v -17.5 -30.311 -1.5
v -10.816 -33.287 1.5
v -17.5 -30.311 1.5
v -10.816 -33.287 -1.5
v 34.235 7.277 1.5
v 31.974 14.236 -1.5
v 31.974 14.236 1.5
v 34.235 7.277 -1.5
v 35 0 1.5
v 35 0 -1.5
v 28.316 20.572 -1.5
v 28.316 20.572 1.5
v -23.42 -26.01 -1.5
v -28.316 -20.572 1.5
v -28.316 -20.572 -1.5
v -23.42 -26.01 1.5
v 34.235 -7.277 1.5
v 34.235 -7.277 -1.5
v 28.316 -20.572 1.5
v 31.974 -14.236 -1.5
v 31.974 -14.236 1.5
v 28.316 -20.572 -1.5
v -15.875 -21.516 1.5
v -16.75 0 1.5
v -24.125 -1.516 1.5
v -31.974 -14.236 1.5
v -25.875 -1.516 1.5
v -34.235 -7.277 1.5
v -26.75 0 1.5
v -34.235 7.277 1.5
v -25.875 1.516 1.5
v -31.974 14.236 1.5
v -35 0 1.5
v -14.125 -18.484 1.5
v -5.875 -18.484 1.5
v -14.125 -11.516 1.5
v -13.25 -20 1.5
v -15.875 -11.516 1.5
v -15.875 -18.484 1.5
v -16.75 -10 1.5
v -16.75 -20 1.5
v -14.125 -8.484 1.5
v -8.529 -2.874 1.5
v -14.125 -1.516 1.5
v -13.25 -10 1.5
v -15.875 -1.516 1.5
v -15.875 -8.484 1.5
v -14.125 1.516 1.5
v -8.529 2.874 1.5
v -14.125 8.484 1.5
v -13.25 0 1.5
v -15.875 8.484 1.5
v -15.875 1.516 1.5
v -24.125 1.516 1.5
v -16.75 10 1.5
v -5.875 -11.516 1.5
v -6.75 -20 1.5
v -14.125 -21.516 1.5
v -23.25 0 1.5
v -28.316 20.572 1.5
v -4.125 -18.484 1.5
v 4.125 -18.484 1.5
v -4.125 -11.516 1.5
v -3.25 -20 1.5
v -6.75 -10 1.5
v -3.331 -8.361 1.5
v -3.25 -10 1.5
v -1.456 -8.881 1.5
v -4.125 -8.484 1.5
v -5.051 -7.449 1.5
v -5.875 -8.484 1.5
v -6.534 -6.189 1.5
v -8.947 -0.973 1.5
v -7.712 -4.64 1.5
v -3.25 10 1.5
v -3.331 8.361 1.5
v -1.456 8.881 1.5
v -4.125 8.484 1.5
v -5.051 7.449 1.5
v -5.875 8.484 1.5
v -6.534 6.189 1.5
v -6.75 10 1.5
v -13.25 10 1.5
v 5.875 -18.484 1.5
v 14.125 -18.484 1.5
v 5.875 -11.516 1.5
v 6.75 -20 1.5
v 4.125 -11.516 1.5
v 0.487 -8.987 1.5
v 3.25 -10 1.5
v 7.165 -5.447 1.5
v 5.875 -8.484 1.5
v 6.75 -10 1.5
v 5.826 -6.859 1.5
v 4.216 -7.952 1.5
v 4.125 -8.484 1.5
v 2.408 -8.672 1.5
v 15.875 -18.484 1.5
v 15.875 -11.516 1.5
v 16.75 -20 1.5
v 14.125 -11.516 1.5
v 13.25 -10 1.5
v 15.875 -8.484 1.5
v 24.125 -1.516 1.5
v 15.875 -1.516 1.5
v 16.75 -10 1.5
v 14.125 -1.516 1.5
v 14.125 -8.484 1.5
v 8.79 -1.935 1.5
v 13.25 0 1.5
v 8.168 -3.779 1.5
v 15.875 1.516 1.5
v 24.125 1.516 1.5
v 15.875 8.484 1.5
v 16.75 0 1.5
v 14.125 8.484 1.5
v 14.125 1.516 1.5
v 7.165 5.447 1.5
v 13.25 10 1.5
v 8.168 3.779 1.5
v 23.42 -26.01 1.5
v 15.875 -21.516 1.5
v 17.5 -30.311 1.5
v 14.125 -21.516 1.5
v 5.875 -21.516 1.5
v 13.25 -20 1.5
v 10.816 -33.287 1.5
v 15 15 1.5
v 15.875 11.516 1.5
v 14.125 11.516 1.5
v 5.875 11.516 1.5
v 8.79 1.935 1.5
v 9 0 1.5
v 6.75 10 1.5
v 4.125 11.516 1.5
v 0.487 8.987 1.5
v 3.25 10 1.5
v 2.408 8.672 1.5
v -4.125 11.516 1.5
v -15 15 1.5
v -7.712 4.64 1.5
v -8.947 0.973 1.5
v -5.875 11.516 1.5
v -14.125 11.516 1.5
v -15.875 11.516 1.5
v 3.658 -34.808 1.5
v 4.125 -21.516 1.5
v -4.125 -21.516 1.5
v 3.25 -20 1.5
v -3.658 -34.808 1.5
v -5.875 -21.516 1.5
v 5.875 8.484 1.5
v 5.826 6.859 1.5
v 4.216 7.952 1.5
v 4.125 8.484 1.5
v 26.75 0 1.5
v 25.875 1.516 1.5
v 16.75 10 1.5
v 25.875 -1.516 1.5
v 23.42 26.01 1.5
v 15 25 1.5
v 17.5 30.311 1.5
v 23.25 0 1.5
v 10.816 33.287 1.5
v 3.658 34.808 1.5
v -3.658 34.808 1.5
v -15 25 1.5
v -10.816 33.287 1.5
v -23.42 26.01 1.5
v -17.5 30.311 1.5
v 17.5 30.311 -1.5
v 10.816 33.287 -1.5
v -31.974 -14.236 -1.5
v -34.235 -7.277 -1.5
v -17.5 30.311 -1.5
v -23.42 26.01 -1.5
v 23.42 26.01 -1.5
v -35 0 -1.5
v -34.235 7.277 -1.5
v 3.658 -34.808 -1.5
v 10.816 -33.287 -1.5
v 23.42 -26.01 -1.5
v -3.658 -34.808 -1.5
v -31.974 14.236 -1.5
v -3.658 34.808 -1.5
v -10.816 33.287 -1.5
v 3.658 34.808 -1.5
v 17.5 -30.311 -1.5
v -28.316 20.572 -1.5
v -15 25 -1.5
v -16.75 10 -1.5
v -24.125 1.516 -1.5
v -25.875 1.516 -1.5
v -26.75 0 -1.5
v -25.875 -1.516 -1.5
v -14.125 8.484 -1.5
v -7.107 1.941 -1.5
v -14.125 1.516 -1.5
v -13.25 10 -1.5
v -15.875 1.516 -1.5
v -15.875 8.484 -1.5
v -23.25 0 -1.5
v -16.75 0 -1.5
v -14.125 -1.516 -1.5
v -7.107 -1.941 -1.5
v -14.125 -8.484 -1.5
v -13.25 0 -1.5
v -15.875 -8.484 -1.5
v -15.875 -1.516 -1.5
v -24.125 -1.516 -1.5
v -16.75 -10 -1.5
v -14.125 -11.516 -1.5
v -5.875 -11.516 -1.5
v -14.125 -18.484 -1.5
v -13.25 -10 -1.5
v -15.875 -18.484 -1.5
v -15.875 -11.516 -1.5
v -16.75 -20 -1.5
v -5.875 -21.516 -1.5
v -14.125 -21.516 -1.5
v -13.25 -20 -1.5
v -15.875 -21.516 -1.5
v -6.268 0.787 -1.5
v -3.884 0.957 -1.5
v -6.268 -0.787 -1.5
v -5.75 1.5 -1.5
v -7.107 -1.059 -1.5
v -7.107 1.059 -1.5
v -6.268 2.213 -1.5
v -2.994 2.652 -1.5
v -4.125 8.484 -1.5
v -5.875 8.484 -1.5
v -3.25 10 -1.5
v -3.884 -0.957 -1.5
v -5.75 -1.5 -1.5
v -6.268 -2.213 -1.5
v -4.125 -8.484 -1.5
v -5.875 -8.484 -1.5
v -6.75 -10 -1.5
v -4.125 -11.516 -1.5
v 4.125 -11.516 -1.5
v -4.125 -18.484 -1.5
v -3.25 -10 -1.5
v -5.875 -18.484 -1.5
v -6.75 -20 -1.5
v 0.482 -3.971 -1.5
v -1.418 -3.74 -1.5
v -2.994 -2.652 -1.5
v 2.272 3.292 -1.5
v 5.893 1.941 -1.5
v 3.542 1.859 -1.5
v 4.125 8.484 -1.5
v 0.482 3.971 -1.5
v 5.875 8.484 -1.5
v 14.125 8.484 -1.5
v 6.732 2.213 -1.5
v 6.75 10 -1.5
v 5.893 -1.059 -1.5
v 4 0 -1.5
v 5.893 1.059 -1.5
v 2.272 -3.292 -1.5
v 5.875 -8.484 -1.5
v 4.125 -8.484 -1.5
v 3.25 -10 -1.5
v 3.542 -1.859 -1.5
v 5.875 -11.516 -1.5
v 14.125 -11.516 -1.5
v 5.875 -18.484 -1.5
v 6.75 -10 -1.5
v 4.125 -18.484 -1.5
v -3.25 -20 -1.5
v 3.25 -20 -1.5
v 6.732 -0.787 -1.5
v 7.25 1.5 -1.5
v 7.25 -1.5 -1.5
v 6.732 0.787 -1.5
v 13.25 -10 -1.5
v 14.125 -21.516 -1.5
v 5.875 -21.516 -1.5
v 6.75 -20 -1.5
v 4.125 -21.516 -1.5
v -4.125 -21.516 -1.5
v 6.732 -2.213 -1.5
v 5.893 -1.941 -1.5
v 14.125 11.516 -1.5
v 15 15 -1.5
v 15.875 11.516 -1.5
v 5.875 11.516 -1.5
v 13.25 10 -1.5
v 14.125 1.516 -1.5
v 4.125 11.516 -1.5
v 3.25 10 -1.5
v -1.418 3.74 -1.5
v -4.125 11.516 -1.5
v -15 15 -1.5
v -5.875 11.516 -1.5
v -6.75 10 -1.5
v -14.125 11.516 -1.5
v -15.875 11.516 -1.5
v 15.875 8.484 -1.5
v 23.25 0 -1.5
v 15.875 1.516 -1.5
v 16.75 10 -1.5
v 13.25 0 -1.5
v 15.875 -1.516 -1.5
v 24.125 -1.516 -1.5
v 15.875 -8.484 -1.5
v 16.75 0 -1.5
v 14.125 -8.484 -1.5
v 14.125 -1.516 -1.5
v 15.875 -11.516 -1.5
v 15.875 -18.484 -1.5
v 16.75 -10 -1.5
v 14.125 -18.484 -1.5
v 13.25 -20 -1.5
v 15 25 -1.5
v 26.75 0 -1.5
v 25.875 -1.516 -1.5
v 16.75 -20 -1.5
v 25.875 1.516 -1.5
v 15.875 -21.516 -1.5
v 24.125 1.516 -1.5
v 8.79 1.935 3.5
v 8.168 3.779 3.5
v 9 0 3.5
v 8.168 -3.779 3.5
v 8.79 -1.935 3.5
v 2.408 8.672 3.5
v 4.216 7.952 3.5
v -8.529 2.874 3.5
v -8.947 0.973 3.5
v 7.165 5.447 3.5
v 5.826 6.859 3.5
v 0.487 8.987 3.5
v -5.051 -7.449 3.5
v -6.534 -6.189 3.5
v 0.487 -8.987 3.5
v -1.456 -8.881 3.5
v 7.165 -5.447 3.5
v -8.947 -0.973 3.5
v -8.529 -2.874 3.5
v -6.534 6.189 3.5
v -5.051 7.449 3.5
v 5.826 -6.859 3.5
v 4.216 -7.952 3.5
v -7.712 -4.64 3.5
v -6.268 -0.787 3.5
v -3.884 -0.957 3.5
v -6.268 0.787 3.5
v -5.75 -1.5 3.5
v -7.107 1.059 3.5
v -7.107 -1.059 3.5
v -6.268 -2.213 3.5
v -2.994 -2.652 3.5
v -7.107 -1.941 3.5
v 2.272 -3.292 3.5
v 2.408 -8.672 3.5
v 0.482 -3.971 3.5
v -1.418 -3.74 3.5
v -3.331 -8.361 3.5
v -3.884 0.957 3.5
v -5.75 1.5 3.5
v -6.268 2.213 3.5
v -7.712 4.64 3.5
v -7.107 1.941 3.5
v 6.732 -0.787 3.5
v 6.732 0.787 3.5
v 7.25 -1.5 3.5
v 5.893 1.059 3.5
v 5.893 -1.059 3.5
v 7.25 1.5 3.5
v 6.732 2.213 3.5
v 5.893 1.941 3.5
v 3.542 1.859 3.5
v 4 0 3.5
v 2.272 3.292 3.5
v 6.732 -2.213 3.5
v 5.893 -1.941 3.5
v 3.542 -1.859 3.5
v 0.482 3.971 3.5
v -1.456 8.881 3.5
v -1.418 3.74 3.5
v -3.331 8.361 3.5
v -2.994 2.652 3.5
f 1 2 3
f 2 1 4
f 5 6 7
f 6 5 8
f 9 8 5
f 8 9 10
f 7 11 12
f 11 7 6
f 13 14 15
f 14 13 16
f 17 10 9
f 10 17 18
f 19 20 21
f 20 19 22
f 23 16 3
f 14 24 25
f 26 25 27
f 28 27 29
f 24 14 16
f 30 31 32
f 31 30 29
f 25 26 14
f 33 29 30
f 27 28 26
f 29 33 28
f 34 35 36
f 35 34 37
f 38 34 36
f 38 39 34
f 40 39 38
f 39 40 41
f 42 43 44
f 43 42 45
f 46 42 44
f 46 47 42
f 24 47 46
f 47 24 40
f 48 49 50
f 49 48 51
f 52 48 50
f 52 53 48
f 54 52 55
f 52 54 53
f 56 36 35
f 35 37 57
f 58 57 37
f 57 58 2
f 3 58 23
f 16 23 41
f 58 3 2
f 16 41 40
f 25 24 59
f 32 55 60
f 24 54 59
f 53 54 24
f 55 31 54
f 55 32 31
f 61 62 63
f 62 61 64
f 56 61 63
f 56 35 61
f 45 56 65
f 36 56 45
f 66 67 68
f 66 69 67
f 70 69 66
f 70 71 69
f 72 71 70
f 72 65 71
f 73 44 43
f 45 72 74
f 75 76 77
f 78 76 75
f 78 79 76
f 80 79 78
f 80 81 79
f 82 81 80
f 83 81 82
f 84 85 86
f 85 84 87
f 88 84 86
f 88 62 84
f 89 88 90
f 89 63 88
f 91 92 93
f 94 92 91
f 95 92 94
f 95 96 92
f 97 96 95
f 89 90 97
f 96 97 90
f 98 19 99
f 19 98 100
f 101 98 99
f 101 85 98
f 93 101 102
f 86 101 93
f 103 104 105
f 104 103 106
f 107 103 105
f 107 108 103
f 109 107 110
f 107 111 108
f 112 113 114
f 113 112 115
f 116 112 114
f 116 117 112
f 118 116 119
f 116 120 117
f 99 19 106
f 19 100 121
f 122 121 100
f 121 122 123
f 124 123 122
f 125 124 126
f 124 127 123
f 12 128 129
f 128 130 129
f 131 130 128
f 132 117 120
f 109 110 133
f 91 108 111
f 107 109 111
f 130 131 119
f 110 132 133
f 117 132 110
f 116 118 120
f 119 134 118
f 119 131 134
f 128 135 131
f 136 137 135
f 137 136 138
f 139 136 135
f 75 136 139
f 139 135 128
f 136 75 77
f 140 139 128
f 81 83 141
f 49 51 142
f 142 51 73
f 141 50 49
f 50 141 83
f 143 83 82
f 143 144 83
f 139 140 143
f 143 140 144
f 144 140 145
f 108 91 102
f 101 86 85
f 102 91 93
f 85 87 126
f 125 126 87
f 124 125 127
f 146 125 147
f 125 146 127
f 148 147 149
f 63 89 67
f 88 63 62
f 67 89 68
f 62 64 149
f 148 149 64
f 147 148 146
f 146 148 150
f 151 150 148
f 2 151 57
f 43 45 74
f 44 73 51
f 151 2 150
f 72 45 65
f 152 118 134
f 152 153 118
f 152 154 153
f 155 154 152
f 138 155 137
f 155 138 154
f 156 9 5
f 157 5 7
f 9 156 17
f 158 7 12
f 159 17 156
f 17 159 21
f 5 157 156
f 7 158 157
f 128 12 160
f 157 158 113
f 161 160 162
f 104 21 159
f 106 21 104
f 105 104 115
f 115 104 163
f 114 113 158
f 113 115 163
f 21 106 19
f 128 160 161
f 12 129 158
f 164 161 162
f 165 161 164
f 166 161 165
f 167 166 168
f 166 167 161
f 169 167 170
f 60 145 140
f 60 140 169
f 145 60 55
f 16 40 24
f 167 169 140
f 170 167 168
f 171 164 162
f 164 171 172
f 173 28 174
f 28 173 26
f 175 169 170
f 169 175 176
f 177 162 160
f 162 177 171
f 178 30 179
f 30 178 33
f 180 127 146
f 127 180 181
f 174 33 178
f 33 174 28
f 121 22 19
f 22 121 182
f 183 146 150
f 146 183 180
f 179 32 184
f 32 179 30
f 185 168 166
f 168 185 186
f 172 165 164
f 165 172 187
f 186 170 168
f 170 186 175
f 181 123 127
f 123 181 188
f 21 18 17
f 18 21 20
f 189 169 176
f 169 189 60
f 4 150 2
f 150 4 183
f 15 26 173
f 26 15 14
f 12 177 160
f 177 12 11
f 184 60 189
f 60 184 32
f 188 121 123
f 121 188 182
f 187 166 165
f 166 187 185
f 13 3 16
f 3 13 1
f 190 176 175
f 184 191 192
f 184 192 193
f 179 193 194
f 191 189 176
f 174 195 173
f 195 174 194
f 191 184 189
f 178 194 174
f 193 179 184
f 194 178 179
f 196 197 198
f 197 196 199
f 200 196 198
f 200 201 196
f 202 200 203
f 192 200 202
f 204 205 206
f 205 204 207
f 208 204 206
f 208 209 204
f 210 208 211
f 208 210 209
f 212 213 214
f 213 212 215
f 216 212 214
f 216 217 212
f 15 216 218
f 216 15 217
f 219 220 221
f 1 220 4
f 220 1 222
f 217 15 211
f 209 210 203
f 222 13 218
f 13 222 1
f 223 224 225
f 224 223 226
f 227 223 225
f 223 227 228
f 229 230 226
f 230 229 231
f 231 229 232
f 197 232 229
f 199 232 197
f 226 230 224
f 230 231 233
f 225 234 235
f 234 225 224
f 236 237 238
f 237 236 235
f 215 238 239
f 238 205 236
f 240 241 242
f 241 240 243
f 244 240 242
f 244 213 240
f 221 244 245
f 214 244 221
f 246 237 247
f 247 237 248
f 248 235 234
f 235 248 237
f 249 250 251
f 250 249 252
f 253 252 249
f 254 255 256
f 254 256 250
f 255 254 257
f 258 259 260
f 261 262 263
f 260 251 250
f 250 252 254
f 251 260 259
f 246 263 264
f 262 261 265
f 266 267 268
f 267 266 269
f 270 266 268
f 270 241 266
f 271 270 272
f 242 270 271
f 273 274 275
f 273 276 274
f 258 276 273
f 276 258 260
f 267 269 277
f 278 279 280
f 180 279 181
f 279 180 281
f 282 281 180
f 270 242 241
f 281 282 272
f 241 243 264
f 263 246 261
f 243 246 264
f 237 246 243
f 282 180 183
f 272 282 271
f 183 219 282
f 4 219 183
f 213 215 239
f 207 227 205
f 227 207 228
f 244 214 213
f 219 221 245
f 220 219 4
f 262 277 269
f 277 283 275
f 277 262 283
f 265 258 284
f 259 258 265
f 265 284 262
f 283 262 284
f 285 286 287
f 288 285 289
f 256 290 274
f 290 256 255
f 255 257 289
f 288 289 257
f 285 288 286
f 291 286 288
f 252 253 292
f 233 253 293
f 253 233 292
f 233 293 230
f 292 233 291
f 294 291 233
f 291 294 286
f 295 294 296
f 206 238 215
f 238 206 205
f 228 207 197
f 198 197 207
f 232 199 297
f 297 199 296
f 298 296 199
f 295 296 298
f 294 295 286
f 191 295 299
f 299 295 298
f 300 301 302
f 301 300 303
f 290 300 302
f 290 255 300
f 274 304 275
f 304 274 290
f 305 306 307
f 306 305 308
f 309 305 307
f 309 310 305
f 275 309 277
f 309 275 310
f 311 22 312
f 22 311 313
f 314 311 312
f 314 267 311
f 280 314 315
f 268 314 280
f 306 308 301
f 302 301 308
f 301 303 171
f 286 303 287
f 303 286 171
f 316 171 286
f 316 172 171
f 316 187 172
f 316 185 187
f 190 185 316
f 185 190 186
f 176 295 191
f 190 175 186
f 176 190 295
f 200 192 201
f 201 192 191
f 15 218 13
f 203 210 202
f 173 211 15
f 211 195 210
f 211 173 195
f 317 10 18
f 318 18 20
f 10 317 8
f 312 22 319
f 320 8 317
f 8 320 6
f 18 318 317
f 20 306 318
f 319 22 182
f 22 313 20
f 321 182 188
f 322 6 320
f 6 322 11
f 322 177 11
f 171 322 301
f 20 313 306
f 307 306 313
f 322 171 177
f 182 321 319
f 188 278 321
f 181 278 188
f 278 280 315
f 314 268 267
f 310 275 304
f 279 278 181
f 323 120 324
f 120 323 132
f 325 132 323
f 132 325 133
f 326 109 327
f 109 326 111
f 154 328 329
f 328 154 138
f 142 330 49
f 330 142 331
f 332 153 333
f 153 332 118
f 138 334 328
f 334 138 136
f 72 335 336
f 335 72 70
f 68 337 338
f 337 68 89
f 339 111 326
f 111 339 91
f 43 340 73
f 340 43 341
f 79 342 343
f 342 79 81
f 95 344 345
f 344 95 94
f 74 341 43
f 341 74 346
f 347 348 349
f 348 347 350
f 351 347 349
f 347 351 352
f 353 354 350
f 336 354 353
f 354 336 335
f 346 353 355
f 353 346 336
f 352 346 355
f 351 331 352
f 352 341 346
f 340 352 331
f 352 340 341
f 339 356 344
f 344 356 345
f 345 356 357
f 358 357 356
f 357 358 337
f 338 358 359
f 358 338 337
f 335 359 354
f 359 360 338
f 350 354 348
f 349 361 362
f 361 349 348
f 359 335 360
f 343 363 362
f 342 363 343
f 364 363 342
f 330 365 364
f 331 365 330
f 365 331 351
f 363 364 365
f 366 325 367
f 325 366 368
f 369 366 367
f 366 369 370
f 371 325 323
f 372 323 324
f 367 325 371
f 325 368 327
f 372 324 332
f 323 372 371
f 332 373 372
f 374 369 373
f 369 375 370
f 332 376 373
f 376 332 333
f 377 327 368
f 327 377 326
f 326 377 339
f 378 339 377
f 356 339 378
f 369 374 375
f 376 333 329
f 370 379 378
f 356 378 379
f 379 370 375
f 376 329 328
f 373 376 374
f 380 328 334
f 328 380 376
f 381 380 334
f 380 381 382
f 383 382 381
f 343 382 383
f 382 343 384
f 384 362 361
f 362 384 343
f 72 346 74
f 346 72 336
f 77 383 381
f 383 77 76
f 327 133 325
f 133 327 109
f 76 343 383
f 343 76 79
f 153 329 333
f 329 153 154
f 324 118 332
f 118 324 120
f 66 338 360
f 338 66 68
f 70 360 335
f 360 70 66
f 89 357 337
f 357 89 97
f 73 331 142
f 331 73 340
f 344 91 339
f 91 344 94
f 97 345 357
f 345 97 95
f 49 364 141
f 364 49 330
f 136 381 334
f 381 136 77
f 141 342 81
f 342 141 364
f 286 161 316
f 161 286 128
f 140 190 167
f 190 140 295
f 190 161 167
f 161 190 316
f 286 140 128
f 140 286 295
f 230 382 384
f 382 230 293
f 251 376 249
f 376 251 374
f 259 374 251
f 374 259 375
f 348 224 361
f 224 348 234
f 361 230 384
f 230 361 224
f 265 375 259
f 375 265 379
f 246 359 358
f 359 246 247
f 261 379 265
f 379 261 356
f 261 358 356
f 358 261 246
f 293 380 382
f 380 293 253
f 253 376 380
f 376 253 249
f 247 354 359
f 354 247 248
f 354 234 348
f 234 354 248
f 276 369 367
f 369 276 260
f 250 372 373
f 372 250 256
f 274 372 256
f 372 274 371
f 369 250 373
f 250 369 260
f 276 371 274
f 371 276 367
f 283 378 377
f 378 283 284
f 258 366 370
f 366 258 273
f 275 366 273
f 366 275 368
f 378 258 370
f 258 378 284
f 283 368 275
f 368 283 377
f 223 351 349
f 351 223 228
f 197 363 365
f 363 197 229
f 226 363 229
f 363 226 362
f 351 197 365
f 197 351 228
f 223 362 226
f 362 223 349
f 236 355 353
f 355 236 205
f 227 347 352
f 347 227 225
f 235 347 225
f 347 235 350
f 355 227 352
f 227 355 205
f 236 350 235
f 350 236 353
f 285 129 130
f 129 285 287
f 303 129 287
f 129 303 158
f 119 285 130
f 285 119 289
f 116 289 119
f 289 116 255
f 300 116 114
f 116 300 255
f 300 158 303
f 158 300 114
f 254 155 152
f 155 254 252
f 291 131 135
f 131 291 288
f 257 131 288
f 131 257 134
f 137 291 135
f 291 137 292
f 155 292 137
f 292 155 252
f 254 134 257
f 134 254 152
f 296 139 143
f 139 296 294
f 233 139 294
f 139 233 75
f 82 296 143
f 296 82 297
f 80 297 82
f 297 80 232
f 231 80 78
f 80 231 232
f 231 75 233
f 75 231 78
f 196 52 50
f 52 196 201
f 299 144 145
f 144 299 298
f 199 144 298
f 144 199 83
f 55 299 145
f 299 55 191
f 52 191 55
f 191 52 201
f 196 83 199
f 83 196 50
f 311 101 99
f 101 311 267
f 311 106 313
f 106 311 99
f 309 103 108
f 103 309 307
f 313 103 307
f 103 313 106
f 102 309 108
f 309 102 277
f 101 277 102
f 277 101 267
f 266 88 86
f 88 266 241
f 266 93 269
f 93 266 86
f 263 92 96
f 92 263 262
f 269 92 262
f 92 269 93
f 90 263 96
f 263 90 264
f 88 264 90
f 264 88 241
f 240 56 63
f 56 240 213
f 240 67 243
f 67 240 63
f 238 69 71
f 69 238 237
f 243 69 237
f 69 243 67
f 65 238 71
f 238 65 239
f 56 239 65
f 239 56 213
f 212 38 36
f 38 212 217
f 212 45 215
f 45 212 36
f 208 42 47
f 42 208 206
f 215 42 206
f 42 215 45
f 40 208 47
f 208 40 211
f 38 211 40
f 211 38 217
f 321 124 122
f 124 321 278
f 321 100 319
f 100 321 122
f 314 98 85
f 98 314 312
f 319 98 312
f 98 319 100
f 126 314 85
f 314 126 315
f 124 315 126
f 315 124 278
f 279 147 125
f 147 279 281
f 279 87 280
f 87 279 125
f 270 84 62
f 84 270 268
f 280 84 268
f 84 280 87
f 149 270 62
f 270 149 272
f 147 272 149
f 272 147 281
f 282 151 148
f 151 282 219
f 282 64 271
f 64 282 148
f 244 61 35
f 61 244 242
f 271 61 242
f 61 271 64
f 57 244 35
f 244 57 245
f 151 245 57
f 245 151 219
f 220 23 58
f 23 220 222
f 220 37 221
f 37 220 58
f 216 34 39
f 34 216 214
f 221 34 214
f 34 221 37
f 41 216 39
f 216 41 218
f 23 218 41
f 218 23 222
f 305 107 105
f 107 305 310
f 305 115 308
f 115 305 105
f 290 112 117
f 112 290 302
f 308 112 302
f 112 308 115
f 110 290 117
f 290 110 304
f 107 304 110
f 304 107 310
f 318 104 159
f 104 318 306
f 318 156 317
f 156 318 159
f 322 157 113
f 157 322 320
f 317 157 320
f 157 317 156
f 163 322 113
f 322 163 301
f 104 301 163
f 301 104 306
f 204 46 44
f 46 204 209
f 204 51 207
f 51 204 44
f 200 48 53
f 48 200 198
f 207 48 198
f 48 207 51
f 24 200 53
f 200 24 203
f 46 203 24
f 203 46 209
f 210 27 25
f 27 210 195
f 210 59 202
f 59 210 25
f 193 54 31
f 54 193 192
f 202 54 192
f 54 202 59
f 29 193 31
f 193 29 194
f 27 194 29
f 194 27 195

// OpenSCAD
// file: settings.scad
baseWidth = 70;
baseRadius = baseWidth / 2;
baseHeight = 3;
wheelCutDepth = 10;
wheelCutSize = 50;
motorWidth = 12;
motorHeight = 10;
motorLength = 23;
motorScrewSize = 4;

railDiameter=5.5;
railWidth=24;
railPos=28;


servoWidth=25;
servoDepth=13;
servoOffset=6;
// main file
include <settings.scad>;

camTop();


module camTop(){
    difference(){
        union(){
            cylinder(d=baseWidth,h=baseHeight, center=true);
            translate([0,0,2])
                cylinder(d=18,h=baseHeight, center=true);
        }
        union(){
            
            translate([0,20,0])
                cube([30, 10, baseHeight],center=true);
            
            
            cylinder(d=8,h=100, center=true);
            
            translate([13/2,1.5,0])
                cylinder(d=1.5,h=100, center=true);
            translate([13/2,-1.5,0])
                cylinder(d=1.5,h=100, center=true);
            
            translate([-13/2,1.5,0])
                cylinder(d=1.5,h=100, center=true);
            translate([-13/2,-1.5,0])
                cylinder(d=1.5,h=100, center=true);
            
            
            translate([15,10,0])
                cylinder(d=3.5,h=100, center=true);
            translate([5,10,0])
                cylinder(d=3.5,h=100, center=true);
            translate([-5,10,0])
                cylinder(d=3.5,h=100, center=true);
            translate([-15,10,0])
                cylinder(d=3.5,h=100, center=true);
                
            translate([15,-10,0])
                cylinder(d=3.5,h=100, center=true);
            translate([5,-10,0])
                cylinder(d=3.5,h=100, center=true);
            translate([-5,-10,0])
                cylinder(d=3.5,h=100, center=true);
            translate([-15,-10,0])
                cylinder(d=3.5,h=100, center=true);
                
            translate([15,-20,0])
                cylinder(d=3.5,h=100, center=true);
            translate([5,-20,0])
                cylinder(d=3.5,h=100, center=true);
            translate([-5,-20,0])
                cylinder(d=3.5,h=100, center=true);
            translate([-15,-20,0])
                cylinder(d=3.5,h=100, center=true);
            
            
            translate([15,-0,0])
                cylinder(d=3.5,h=100, center=true);
            translate([25,-0,0])
                cylinder(d=3.5,h=100, center=true);
            
            
            translate([-15,-0,0])
                cylinder(d=3.5,h=100, center=true);
            translate([-25,-0,0])
                cylinder(d=3.5,h=100, center=true);
            
        }
        
    }
    
}

module top(){
    difference (){
        
        cylinder(d=baseWidth,h=baseHeight, center=true);
        
        union(){
            translate([baseRadius-wheelCutDepth+wheelCutDepth/2,0,0])
                cube([wheelCutDepth, wheelCutSize, baseHeight],center=true);
            translate([-1*(baseRadius-wheelCutDepth+wheelCutDepth/2),0,0])
                cube([wheelCutDepth, wheelCutSize, baseHeight],center=true);
            
            translate([railWidth/2-railDiameter/2,railPos,0])
                cylinder(d=railDiameter,h=100, center=true);
            translate([-1*(railWidth/2-railDiameter/2),railPos,0])
                cylinder(d=railDiameter,h=100, center=true);
            
            translate([railWidth/2-railDiameter/2,-railPos,0])
                cylinder(d=railDiameter,h=100, center=true);
            translate([-(railWidth/2-railDiameter/2),-railPos,0])
                cylinder(d=railDiameter,h=100, center=true);
            
            translate([-servoOffset,0,0])
                cube([servoWidth, servoDepth,100], center=true);
            
            translate([servoOffset+2,0,0])
                cylinder(d=2,h=100, center=true);
            
            translate([servoOffset+6-32,0,0])
                cylinder(d=2,h=100, center=true);
            
        }
    }
}

module base(){
    difference (){
        
        cylinder(d=baseWidth,h=baseHeight, center=true);
        
        union(){
            translate([baseRadius-wheelCutDepth+wheelCutDepth/2-1,0,0])
                cube([wheelCutDepth+1, wheelCutSize, baseHeight],center=true);
            translate([-1*(baseRadius-wheelCutDepth+wheelCutDepth/2-1),0,0])
                cube([wheelCutDepth+1, wheelCutSize, baseHeight],center=true);
            
            translate([railWidth/2-railDiameter/2,railPos,0])
                cylinder(d=railDiameter,h=100, center=true);
            translate([-1*(railWidth/2-railDiameter/2),railPos,0])
                cylinder(d=railDiameter,h=100, center=true);
            
            translate([railWidth/2-railDiameter/2,-railPos,0])
                cylinder(d=railDiameter,h=100, center=true);
            translate([-(railWidth/2-railDiameter/2),-railPos,0])
                cylinder(d=railDiameter,h=100, center=true);
            
            
            translate([baseRadius-wheelCutDepth-motorScrewSize/2-3,23/2,0])
                cylinder(d=motorScrewSize,h=100, center=true);
            translate([baseRadius-wheelCutDepth-motorScrewSize/2-3-13,23/2,0])
                cylinder(d=motorScrewSize,h=100, center=true);
            
            
            translate([baseRadius-wheelCutDepth-motorScrewSize/2-3,-23/2,0])
                cylinder(d=motorScrewSize,h=100, center=true);
            translate([baseRadius-wheelCutDepth-motorScrewSize/2-3-13,-23/2,0])
                cylinder(d=motorScrewSize,h=100, center=true);
            
            translate([-(baseRadius-wheelCutDepth-motorScrewSize/2-3),23/2,0])
                cylinder(d=motorScrewSize,h=100, center=true);
            translate([-(baseRadius-wheelCutDepth-motorScrewSize/2-3-13),23/2,0])
                cylinder(d=motorScrewSize,h=100, center=true);
            
            
            translate([-(baseRadius-wheelCutDepth-motorScrewSize/2-3),-23/2,0])
                cylinder(d=motorScrewSize,h=100, center=true);
            translate([-(baseRadius-wheelCutDepth-motorScrewSize/2-3-13),-23/2,0])
                cylinder(d=motorScrewSize,h=100, center=true);
            

        }
       
    }
}

*translate([0,20,85/2])
    cube([55,1,85], center=true);
